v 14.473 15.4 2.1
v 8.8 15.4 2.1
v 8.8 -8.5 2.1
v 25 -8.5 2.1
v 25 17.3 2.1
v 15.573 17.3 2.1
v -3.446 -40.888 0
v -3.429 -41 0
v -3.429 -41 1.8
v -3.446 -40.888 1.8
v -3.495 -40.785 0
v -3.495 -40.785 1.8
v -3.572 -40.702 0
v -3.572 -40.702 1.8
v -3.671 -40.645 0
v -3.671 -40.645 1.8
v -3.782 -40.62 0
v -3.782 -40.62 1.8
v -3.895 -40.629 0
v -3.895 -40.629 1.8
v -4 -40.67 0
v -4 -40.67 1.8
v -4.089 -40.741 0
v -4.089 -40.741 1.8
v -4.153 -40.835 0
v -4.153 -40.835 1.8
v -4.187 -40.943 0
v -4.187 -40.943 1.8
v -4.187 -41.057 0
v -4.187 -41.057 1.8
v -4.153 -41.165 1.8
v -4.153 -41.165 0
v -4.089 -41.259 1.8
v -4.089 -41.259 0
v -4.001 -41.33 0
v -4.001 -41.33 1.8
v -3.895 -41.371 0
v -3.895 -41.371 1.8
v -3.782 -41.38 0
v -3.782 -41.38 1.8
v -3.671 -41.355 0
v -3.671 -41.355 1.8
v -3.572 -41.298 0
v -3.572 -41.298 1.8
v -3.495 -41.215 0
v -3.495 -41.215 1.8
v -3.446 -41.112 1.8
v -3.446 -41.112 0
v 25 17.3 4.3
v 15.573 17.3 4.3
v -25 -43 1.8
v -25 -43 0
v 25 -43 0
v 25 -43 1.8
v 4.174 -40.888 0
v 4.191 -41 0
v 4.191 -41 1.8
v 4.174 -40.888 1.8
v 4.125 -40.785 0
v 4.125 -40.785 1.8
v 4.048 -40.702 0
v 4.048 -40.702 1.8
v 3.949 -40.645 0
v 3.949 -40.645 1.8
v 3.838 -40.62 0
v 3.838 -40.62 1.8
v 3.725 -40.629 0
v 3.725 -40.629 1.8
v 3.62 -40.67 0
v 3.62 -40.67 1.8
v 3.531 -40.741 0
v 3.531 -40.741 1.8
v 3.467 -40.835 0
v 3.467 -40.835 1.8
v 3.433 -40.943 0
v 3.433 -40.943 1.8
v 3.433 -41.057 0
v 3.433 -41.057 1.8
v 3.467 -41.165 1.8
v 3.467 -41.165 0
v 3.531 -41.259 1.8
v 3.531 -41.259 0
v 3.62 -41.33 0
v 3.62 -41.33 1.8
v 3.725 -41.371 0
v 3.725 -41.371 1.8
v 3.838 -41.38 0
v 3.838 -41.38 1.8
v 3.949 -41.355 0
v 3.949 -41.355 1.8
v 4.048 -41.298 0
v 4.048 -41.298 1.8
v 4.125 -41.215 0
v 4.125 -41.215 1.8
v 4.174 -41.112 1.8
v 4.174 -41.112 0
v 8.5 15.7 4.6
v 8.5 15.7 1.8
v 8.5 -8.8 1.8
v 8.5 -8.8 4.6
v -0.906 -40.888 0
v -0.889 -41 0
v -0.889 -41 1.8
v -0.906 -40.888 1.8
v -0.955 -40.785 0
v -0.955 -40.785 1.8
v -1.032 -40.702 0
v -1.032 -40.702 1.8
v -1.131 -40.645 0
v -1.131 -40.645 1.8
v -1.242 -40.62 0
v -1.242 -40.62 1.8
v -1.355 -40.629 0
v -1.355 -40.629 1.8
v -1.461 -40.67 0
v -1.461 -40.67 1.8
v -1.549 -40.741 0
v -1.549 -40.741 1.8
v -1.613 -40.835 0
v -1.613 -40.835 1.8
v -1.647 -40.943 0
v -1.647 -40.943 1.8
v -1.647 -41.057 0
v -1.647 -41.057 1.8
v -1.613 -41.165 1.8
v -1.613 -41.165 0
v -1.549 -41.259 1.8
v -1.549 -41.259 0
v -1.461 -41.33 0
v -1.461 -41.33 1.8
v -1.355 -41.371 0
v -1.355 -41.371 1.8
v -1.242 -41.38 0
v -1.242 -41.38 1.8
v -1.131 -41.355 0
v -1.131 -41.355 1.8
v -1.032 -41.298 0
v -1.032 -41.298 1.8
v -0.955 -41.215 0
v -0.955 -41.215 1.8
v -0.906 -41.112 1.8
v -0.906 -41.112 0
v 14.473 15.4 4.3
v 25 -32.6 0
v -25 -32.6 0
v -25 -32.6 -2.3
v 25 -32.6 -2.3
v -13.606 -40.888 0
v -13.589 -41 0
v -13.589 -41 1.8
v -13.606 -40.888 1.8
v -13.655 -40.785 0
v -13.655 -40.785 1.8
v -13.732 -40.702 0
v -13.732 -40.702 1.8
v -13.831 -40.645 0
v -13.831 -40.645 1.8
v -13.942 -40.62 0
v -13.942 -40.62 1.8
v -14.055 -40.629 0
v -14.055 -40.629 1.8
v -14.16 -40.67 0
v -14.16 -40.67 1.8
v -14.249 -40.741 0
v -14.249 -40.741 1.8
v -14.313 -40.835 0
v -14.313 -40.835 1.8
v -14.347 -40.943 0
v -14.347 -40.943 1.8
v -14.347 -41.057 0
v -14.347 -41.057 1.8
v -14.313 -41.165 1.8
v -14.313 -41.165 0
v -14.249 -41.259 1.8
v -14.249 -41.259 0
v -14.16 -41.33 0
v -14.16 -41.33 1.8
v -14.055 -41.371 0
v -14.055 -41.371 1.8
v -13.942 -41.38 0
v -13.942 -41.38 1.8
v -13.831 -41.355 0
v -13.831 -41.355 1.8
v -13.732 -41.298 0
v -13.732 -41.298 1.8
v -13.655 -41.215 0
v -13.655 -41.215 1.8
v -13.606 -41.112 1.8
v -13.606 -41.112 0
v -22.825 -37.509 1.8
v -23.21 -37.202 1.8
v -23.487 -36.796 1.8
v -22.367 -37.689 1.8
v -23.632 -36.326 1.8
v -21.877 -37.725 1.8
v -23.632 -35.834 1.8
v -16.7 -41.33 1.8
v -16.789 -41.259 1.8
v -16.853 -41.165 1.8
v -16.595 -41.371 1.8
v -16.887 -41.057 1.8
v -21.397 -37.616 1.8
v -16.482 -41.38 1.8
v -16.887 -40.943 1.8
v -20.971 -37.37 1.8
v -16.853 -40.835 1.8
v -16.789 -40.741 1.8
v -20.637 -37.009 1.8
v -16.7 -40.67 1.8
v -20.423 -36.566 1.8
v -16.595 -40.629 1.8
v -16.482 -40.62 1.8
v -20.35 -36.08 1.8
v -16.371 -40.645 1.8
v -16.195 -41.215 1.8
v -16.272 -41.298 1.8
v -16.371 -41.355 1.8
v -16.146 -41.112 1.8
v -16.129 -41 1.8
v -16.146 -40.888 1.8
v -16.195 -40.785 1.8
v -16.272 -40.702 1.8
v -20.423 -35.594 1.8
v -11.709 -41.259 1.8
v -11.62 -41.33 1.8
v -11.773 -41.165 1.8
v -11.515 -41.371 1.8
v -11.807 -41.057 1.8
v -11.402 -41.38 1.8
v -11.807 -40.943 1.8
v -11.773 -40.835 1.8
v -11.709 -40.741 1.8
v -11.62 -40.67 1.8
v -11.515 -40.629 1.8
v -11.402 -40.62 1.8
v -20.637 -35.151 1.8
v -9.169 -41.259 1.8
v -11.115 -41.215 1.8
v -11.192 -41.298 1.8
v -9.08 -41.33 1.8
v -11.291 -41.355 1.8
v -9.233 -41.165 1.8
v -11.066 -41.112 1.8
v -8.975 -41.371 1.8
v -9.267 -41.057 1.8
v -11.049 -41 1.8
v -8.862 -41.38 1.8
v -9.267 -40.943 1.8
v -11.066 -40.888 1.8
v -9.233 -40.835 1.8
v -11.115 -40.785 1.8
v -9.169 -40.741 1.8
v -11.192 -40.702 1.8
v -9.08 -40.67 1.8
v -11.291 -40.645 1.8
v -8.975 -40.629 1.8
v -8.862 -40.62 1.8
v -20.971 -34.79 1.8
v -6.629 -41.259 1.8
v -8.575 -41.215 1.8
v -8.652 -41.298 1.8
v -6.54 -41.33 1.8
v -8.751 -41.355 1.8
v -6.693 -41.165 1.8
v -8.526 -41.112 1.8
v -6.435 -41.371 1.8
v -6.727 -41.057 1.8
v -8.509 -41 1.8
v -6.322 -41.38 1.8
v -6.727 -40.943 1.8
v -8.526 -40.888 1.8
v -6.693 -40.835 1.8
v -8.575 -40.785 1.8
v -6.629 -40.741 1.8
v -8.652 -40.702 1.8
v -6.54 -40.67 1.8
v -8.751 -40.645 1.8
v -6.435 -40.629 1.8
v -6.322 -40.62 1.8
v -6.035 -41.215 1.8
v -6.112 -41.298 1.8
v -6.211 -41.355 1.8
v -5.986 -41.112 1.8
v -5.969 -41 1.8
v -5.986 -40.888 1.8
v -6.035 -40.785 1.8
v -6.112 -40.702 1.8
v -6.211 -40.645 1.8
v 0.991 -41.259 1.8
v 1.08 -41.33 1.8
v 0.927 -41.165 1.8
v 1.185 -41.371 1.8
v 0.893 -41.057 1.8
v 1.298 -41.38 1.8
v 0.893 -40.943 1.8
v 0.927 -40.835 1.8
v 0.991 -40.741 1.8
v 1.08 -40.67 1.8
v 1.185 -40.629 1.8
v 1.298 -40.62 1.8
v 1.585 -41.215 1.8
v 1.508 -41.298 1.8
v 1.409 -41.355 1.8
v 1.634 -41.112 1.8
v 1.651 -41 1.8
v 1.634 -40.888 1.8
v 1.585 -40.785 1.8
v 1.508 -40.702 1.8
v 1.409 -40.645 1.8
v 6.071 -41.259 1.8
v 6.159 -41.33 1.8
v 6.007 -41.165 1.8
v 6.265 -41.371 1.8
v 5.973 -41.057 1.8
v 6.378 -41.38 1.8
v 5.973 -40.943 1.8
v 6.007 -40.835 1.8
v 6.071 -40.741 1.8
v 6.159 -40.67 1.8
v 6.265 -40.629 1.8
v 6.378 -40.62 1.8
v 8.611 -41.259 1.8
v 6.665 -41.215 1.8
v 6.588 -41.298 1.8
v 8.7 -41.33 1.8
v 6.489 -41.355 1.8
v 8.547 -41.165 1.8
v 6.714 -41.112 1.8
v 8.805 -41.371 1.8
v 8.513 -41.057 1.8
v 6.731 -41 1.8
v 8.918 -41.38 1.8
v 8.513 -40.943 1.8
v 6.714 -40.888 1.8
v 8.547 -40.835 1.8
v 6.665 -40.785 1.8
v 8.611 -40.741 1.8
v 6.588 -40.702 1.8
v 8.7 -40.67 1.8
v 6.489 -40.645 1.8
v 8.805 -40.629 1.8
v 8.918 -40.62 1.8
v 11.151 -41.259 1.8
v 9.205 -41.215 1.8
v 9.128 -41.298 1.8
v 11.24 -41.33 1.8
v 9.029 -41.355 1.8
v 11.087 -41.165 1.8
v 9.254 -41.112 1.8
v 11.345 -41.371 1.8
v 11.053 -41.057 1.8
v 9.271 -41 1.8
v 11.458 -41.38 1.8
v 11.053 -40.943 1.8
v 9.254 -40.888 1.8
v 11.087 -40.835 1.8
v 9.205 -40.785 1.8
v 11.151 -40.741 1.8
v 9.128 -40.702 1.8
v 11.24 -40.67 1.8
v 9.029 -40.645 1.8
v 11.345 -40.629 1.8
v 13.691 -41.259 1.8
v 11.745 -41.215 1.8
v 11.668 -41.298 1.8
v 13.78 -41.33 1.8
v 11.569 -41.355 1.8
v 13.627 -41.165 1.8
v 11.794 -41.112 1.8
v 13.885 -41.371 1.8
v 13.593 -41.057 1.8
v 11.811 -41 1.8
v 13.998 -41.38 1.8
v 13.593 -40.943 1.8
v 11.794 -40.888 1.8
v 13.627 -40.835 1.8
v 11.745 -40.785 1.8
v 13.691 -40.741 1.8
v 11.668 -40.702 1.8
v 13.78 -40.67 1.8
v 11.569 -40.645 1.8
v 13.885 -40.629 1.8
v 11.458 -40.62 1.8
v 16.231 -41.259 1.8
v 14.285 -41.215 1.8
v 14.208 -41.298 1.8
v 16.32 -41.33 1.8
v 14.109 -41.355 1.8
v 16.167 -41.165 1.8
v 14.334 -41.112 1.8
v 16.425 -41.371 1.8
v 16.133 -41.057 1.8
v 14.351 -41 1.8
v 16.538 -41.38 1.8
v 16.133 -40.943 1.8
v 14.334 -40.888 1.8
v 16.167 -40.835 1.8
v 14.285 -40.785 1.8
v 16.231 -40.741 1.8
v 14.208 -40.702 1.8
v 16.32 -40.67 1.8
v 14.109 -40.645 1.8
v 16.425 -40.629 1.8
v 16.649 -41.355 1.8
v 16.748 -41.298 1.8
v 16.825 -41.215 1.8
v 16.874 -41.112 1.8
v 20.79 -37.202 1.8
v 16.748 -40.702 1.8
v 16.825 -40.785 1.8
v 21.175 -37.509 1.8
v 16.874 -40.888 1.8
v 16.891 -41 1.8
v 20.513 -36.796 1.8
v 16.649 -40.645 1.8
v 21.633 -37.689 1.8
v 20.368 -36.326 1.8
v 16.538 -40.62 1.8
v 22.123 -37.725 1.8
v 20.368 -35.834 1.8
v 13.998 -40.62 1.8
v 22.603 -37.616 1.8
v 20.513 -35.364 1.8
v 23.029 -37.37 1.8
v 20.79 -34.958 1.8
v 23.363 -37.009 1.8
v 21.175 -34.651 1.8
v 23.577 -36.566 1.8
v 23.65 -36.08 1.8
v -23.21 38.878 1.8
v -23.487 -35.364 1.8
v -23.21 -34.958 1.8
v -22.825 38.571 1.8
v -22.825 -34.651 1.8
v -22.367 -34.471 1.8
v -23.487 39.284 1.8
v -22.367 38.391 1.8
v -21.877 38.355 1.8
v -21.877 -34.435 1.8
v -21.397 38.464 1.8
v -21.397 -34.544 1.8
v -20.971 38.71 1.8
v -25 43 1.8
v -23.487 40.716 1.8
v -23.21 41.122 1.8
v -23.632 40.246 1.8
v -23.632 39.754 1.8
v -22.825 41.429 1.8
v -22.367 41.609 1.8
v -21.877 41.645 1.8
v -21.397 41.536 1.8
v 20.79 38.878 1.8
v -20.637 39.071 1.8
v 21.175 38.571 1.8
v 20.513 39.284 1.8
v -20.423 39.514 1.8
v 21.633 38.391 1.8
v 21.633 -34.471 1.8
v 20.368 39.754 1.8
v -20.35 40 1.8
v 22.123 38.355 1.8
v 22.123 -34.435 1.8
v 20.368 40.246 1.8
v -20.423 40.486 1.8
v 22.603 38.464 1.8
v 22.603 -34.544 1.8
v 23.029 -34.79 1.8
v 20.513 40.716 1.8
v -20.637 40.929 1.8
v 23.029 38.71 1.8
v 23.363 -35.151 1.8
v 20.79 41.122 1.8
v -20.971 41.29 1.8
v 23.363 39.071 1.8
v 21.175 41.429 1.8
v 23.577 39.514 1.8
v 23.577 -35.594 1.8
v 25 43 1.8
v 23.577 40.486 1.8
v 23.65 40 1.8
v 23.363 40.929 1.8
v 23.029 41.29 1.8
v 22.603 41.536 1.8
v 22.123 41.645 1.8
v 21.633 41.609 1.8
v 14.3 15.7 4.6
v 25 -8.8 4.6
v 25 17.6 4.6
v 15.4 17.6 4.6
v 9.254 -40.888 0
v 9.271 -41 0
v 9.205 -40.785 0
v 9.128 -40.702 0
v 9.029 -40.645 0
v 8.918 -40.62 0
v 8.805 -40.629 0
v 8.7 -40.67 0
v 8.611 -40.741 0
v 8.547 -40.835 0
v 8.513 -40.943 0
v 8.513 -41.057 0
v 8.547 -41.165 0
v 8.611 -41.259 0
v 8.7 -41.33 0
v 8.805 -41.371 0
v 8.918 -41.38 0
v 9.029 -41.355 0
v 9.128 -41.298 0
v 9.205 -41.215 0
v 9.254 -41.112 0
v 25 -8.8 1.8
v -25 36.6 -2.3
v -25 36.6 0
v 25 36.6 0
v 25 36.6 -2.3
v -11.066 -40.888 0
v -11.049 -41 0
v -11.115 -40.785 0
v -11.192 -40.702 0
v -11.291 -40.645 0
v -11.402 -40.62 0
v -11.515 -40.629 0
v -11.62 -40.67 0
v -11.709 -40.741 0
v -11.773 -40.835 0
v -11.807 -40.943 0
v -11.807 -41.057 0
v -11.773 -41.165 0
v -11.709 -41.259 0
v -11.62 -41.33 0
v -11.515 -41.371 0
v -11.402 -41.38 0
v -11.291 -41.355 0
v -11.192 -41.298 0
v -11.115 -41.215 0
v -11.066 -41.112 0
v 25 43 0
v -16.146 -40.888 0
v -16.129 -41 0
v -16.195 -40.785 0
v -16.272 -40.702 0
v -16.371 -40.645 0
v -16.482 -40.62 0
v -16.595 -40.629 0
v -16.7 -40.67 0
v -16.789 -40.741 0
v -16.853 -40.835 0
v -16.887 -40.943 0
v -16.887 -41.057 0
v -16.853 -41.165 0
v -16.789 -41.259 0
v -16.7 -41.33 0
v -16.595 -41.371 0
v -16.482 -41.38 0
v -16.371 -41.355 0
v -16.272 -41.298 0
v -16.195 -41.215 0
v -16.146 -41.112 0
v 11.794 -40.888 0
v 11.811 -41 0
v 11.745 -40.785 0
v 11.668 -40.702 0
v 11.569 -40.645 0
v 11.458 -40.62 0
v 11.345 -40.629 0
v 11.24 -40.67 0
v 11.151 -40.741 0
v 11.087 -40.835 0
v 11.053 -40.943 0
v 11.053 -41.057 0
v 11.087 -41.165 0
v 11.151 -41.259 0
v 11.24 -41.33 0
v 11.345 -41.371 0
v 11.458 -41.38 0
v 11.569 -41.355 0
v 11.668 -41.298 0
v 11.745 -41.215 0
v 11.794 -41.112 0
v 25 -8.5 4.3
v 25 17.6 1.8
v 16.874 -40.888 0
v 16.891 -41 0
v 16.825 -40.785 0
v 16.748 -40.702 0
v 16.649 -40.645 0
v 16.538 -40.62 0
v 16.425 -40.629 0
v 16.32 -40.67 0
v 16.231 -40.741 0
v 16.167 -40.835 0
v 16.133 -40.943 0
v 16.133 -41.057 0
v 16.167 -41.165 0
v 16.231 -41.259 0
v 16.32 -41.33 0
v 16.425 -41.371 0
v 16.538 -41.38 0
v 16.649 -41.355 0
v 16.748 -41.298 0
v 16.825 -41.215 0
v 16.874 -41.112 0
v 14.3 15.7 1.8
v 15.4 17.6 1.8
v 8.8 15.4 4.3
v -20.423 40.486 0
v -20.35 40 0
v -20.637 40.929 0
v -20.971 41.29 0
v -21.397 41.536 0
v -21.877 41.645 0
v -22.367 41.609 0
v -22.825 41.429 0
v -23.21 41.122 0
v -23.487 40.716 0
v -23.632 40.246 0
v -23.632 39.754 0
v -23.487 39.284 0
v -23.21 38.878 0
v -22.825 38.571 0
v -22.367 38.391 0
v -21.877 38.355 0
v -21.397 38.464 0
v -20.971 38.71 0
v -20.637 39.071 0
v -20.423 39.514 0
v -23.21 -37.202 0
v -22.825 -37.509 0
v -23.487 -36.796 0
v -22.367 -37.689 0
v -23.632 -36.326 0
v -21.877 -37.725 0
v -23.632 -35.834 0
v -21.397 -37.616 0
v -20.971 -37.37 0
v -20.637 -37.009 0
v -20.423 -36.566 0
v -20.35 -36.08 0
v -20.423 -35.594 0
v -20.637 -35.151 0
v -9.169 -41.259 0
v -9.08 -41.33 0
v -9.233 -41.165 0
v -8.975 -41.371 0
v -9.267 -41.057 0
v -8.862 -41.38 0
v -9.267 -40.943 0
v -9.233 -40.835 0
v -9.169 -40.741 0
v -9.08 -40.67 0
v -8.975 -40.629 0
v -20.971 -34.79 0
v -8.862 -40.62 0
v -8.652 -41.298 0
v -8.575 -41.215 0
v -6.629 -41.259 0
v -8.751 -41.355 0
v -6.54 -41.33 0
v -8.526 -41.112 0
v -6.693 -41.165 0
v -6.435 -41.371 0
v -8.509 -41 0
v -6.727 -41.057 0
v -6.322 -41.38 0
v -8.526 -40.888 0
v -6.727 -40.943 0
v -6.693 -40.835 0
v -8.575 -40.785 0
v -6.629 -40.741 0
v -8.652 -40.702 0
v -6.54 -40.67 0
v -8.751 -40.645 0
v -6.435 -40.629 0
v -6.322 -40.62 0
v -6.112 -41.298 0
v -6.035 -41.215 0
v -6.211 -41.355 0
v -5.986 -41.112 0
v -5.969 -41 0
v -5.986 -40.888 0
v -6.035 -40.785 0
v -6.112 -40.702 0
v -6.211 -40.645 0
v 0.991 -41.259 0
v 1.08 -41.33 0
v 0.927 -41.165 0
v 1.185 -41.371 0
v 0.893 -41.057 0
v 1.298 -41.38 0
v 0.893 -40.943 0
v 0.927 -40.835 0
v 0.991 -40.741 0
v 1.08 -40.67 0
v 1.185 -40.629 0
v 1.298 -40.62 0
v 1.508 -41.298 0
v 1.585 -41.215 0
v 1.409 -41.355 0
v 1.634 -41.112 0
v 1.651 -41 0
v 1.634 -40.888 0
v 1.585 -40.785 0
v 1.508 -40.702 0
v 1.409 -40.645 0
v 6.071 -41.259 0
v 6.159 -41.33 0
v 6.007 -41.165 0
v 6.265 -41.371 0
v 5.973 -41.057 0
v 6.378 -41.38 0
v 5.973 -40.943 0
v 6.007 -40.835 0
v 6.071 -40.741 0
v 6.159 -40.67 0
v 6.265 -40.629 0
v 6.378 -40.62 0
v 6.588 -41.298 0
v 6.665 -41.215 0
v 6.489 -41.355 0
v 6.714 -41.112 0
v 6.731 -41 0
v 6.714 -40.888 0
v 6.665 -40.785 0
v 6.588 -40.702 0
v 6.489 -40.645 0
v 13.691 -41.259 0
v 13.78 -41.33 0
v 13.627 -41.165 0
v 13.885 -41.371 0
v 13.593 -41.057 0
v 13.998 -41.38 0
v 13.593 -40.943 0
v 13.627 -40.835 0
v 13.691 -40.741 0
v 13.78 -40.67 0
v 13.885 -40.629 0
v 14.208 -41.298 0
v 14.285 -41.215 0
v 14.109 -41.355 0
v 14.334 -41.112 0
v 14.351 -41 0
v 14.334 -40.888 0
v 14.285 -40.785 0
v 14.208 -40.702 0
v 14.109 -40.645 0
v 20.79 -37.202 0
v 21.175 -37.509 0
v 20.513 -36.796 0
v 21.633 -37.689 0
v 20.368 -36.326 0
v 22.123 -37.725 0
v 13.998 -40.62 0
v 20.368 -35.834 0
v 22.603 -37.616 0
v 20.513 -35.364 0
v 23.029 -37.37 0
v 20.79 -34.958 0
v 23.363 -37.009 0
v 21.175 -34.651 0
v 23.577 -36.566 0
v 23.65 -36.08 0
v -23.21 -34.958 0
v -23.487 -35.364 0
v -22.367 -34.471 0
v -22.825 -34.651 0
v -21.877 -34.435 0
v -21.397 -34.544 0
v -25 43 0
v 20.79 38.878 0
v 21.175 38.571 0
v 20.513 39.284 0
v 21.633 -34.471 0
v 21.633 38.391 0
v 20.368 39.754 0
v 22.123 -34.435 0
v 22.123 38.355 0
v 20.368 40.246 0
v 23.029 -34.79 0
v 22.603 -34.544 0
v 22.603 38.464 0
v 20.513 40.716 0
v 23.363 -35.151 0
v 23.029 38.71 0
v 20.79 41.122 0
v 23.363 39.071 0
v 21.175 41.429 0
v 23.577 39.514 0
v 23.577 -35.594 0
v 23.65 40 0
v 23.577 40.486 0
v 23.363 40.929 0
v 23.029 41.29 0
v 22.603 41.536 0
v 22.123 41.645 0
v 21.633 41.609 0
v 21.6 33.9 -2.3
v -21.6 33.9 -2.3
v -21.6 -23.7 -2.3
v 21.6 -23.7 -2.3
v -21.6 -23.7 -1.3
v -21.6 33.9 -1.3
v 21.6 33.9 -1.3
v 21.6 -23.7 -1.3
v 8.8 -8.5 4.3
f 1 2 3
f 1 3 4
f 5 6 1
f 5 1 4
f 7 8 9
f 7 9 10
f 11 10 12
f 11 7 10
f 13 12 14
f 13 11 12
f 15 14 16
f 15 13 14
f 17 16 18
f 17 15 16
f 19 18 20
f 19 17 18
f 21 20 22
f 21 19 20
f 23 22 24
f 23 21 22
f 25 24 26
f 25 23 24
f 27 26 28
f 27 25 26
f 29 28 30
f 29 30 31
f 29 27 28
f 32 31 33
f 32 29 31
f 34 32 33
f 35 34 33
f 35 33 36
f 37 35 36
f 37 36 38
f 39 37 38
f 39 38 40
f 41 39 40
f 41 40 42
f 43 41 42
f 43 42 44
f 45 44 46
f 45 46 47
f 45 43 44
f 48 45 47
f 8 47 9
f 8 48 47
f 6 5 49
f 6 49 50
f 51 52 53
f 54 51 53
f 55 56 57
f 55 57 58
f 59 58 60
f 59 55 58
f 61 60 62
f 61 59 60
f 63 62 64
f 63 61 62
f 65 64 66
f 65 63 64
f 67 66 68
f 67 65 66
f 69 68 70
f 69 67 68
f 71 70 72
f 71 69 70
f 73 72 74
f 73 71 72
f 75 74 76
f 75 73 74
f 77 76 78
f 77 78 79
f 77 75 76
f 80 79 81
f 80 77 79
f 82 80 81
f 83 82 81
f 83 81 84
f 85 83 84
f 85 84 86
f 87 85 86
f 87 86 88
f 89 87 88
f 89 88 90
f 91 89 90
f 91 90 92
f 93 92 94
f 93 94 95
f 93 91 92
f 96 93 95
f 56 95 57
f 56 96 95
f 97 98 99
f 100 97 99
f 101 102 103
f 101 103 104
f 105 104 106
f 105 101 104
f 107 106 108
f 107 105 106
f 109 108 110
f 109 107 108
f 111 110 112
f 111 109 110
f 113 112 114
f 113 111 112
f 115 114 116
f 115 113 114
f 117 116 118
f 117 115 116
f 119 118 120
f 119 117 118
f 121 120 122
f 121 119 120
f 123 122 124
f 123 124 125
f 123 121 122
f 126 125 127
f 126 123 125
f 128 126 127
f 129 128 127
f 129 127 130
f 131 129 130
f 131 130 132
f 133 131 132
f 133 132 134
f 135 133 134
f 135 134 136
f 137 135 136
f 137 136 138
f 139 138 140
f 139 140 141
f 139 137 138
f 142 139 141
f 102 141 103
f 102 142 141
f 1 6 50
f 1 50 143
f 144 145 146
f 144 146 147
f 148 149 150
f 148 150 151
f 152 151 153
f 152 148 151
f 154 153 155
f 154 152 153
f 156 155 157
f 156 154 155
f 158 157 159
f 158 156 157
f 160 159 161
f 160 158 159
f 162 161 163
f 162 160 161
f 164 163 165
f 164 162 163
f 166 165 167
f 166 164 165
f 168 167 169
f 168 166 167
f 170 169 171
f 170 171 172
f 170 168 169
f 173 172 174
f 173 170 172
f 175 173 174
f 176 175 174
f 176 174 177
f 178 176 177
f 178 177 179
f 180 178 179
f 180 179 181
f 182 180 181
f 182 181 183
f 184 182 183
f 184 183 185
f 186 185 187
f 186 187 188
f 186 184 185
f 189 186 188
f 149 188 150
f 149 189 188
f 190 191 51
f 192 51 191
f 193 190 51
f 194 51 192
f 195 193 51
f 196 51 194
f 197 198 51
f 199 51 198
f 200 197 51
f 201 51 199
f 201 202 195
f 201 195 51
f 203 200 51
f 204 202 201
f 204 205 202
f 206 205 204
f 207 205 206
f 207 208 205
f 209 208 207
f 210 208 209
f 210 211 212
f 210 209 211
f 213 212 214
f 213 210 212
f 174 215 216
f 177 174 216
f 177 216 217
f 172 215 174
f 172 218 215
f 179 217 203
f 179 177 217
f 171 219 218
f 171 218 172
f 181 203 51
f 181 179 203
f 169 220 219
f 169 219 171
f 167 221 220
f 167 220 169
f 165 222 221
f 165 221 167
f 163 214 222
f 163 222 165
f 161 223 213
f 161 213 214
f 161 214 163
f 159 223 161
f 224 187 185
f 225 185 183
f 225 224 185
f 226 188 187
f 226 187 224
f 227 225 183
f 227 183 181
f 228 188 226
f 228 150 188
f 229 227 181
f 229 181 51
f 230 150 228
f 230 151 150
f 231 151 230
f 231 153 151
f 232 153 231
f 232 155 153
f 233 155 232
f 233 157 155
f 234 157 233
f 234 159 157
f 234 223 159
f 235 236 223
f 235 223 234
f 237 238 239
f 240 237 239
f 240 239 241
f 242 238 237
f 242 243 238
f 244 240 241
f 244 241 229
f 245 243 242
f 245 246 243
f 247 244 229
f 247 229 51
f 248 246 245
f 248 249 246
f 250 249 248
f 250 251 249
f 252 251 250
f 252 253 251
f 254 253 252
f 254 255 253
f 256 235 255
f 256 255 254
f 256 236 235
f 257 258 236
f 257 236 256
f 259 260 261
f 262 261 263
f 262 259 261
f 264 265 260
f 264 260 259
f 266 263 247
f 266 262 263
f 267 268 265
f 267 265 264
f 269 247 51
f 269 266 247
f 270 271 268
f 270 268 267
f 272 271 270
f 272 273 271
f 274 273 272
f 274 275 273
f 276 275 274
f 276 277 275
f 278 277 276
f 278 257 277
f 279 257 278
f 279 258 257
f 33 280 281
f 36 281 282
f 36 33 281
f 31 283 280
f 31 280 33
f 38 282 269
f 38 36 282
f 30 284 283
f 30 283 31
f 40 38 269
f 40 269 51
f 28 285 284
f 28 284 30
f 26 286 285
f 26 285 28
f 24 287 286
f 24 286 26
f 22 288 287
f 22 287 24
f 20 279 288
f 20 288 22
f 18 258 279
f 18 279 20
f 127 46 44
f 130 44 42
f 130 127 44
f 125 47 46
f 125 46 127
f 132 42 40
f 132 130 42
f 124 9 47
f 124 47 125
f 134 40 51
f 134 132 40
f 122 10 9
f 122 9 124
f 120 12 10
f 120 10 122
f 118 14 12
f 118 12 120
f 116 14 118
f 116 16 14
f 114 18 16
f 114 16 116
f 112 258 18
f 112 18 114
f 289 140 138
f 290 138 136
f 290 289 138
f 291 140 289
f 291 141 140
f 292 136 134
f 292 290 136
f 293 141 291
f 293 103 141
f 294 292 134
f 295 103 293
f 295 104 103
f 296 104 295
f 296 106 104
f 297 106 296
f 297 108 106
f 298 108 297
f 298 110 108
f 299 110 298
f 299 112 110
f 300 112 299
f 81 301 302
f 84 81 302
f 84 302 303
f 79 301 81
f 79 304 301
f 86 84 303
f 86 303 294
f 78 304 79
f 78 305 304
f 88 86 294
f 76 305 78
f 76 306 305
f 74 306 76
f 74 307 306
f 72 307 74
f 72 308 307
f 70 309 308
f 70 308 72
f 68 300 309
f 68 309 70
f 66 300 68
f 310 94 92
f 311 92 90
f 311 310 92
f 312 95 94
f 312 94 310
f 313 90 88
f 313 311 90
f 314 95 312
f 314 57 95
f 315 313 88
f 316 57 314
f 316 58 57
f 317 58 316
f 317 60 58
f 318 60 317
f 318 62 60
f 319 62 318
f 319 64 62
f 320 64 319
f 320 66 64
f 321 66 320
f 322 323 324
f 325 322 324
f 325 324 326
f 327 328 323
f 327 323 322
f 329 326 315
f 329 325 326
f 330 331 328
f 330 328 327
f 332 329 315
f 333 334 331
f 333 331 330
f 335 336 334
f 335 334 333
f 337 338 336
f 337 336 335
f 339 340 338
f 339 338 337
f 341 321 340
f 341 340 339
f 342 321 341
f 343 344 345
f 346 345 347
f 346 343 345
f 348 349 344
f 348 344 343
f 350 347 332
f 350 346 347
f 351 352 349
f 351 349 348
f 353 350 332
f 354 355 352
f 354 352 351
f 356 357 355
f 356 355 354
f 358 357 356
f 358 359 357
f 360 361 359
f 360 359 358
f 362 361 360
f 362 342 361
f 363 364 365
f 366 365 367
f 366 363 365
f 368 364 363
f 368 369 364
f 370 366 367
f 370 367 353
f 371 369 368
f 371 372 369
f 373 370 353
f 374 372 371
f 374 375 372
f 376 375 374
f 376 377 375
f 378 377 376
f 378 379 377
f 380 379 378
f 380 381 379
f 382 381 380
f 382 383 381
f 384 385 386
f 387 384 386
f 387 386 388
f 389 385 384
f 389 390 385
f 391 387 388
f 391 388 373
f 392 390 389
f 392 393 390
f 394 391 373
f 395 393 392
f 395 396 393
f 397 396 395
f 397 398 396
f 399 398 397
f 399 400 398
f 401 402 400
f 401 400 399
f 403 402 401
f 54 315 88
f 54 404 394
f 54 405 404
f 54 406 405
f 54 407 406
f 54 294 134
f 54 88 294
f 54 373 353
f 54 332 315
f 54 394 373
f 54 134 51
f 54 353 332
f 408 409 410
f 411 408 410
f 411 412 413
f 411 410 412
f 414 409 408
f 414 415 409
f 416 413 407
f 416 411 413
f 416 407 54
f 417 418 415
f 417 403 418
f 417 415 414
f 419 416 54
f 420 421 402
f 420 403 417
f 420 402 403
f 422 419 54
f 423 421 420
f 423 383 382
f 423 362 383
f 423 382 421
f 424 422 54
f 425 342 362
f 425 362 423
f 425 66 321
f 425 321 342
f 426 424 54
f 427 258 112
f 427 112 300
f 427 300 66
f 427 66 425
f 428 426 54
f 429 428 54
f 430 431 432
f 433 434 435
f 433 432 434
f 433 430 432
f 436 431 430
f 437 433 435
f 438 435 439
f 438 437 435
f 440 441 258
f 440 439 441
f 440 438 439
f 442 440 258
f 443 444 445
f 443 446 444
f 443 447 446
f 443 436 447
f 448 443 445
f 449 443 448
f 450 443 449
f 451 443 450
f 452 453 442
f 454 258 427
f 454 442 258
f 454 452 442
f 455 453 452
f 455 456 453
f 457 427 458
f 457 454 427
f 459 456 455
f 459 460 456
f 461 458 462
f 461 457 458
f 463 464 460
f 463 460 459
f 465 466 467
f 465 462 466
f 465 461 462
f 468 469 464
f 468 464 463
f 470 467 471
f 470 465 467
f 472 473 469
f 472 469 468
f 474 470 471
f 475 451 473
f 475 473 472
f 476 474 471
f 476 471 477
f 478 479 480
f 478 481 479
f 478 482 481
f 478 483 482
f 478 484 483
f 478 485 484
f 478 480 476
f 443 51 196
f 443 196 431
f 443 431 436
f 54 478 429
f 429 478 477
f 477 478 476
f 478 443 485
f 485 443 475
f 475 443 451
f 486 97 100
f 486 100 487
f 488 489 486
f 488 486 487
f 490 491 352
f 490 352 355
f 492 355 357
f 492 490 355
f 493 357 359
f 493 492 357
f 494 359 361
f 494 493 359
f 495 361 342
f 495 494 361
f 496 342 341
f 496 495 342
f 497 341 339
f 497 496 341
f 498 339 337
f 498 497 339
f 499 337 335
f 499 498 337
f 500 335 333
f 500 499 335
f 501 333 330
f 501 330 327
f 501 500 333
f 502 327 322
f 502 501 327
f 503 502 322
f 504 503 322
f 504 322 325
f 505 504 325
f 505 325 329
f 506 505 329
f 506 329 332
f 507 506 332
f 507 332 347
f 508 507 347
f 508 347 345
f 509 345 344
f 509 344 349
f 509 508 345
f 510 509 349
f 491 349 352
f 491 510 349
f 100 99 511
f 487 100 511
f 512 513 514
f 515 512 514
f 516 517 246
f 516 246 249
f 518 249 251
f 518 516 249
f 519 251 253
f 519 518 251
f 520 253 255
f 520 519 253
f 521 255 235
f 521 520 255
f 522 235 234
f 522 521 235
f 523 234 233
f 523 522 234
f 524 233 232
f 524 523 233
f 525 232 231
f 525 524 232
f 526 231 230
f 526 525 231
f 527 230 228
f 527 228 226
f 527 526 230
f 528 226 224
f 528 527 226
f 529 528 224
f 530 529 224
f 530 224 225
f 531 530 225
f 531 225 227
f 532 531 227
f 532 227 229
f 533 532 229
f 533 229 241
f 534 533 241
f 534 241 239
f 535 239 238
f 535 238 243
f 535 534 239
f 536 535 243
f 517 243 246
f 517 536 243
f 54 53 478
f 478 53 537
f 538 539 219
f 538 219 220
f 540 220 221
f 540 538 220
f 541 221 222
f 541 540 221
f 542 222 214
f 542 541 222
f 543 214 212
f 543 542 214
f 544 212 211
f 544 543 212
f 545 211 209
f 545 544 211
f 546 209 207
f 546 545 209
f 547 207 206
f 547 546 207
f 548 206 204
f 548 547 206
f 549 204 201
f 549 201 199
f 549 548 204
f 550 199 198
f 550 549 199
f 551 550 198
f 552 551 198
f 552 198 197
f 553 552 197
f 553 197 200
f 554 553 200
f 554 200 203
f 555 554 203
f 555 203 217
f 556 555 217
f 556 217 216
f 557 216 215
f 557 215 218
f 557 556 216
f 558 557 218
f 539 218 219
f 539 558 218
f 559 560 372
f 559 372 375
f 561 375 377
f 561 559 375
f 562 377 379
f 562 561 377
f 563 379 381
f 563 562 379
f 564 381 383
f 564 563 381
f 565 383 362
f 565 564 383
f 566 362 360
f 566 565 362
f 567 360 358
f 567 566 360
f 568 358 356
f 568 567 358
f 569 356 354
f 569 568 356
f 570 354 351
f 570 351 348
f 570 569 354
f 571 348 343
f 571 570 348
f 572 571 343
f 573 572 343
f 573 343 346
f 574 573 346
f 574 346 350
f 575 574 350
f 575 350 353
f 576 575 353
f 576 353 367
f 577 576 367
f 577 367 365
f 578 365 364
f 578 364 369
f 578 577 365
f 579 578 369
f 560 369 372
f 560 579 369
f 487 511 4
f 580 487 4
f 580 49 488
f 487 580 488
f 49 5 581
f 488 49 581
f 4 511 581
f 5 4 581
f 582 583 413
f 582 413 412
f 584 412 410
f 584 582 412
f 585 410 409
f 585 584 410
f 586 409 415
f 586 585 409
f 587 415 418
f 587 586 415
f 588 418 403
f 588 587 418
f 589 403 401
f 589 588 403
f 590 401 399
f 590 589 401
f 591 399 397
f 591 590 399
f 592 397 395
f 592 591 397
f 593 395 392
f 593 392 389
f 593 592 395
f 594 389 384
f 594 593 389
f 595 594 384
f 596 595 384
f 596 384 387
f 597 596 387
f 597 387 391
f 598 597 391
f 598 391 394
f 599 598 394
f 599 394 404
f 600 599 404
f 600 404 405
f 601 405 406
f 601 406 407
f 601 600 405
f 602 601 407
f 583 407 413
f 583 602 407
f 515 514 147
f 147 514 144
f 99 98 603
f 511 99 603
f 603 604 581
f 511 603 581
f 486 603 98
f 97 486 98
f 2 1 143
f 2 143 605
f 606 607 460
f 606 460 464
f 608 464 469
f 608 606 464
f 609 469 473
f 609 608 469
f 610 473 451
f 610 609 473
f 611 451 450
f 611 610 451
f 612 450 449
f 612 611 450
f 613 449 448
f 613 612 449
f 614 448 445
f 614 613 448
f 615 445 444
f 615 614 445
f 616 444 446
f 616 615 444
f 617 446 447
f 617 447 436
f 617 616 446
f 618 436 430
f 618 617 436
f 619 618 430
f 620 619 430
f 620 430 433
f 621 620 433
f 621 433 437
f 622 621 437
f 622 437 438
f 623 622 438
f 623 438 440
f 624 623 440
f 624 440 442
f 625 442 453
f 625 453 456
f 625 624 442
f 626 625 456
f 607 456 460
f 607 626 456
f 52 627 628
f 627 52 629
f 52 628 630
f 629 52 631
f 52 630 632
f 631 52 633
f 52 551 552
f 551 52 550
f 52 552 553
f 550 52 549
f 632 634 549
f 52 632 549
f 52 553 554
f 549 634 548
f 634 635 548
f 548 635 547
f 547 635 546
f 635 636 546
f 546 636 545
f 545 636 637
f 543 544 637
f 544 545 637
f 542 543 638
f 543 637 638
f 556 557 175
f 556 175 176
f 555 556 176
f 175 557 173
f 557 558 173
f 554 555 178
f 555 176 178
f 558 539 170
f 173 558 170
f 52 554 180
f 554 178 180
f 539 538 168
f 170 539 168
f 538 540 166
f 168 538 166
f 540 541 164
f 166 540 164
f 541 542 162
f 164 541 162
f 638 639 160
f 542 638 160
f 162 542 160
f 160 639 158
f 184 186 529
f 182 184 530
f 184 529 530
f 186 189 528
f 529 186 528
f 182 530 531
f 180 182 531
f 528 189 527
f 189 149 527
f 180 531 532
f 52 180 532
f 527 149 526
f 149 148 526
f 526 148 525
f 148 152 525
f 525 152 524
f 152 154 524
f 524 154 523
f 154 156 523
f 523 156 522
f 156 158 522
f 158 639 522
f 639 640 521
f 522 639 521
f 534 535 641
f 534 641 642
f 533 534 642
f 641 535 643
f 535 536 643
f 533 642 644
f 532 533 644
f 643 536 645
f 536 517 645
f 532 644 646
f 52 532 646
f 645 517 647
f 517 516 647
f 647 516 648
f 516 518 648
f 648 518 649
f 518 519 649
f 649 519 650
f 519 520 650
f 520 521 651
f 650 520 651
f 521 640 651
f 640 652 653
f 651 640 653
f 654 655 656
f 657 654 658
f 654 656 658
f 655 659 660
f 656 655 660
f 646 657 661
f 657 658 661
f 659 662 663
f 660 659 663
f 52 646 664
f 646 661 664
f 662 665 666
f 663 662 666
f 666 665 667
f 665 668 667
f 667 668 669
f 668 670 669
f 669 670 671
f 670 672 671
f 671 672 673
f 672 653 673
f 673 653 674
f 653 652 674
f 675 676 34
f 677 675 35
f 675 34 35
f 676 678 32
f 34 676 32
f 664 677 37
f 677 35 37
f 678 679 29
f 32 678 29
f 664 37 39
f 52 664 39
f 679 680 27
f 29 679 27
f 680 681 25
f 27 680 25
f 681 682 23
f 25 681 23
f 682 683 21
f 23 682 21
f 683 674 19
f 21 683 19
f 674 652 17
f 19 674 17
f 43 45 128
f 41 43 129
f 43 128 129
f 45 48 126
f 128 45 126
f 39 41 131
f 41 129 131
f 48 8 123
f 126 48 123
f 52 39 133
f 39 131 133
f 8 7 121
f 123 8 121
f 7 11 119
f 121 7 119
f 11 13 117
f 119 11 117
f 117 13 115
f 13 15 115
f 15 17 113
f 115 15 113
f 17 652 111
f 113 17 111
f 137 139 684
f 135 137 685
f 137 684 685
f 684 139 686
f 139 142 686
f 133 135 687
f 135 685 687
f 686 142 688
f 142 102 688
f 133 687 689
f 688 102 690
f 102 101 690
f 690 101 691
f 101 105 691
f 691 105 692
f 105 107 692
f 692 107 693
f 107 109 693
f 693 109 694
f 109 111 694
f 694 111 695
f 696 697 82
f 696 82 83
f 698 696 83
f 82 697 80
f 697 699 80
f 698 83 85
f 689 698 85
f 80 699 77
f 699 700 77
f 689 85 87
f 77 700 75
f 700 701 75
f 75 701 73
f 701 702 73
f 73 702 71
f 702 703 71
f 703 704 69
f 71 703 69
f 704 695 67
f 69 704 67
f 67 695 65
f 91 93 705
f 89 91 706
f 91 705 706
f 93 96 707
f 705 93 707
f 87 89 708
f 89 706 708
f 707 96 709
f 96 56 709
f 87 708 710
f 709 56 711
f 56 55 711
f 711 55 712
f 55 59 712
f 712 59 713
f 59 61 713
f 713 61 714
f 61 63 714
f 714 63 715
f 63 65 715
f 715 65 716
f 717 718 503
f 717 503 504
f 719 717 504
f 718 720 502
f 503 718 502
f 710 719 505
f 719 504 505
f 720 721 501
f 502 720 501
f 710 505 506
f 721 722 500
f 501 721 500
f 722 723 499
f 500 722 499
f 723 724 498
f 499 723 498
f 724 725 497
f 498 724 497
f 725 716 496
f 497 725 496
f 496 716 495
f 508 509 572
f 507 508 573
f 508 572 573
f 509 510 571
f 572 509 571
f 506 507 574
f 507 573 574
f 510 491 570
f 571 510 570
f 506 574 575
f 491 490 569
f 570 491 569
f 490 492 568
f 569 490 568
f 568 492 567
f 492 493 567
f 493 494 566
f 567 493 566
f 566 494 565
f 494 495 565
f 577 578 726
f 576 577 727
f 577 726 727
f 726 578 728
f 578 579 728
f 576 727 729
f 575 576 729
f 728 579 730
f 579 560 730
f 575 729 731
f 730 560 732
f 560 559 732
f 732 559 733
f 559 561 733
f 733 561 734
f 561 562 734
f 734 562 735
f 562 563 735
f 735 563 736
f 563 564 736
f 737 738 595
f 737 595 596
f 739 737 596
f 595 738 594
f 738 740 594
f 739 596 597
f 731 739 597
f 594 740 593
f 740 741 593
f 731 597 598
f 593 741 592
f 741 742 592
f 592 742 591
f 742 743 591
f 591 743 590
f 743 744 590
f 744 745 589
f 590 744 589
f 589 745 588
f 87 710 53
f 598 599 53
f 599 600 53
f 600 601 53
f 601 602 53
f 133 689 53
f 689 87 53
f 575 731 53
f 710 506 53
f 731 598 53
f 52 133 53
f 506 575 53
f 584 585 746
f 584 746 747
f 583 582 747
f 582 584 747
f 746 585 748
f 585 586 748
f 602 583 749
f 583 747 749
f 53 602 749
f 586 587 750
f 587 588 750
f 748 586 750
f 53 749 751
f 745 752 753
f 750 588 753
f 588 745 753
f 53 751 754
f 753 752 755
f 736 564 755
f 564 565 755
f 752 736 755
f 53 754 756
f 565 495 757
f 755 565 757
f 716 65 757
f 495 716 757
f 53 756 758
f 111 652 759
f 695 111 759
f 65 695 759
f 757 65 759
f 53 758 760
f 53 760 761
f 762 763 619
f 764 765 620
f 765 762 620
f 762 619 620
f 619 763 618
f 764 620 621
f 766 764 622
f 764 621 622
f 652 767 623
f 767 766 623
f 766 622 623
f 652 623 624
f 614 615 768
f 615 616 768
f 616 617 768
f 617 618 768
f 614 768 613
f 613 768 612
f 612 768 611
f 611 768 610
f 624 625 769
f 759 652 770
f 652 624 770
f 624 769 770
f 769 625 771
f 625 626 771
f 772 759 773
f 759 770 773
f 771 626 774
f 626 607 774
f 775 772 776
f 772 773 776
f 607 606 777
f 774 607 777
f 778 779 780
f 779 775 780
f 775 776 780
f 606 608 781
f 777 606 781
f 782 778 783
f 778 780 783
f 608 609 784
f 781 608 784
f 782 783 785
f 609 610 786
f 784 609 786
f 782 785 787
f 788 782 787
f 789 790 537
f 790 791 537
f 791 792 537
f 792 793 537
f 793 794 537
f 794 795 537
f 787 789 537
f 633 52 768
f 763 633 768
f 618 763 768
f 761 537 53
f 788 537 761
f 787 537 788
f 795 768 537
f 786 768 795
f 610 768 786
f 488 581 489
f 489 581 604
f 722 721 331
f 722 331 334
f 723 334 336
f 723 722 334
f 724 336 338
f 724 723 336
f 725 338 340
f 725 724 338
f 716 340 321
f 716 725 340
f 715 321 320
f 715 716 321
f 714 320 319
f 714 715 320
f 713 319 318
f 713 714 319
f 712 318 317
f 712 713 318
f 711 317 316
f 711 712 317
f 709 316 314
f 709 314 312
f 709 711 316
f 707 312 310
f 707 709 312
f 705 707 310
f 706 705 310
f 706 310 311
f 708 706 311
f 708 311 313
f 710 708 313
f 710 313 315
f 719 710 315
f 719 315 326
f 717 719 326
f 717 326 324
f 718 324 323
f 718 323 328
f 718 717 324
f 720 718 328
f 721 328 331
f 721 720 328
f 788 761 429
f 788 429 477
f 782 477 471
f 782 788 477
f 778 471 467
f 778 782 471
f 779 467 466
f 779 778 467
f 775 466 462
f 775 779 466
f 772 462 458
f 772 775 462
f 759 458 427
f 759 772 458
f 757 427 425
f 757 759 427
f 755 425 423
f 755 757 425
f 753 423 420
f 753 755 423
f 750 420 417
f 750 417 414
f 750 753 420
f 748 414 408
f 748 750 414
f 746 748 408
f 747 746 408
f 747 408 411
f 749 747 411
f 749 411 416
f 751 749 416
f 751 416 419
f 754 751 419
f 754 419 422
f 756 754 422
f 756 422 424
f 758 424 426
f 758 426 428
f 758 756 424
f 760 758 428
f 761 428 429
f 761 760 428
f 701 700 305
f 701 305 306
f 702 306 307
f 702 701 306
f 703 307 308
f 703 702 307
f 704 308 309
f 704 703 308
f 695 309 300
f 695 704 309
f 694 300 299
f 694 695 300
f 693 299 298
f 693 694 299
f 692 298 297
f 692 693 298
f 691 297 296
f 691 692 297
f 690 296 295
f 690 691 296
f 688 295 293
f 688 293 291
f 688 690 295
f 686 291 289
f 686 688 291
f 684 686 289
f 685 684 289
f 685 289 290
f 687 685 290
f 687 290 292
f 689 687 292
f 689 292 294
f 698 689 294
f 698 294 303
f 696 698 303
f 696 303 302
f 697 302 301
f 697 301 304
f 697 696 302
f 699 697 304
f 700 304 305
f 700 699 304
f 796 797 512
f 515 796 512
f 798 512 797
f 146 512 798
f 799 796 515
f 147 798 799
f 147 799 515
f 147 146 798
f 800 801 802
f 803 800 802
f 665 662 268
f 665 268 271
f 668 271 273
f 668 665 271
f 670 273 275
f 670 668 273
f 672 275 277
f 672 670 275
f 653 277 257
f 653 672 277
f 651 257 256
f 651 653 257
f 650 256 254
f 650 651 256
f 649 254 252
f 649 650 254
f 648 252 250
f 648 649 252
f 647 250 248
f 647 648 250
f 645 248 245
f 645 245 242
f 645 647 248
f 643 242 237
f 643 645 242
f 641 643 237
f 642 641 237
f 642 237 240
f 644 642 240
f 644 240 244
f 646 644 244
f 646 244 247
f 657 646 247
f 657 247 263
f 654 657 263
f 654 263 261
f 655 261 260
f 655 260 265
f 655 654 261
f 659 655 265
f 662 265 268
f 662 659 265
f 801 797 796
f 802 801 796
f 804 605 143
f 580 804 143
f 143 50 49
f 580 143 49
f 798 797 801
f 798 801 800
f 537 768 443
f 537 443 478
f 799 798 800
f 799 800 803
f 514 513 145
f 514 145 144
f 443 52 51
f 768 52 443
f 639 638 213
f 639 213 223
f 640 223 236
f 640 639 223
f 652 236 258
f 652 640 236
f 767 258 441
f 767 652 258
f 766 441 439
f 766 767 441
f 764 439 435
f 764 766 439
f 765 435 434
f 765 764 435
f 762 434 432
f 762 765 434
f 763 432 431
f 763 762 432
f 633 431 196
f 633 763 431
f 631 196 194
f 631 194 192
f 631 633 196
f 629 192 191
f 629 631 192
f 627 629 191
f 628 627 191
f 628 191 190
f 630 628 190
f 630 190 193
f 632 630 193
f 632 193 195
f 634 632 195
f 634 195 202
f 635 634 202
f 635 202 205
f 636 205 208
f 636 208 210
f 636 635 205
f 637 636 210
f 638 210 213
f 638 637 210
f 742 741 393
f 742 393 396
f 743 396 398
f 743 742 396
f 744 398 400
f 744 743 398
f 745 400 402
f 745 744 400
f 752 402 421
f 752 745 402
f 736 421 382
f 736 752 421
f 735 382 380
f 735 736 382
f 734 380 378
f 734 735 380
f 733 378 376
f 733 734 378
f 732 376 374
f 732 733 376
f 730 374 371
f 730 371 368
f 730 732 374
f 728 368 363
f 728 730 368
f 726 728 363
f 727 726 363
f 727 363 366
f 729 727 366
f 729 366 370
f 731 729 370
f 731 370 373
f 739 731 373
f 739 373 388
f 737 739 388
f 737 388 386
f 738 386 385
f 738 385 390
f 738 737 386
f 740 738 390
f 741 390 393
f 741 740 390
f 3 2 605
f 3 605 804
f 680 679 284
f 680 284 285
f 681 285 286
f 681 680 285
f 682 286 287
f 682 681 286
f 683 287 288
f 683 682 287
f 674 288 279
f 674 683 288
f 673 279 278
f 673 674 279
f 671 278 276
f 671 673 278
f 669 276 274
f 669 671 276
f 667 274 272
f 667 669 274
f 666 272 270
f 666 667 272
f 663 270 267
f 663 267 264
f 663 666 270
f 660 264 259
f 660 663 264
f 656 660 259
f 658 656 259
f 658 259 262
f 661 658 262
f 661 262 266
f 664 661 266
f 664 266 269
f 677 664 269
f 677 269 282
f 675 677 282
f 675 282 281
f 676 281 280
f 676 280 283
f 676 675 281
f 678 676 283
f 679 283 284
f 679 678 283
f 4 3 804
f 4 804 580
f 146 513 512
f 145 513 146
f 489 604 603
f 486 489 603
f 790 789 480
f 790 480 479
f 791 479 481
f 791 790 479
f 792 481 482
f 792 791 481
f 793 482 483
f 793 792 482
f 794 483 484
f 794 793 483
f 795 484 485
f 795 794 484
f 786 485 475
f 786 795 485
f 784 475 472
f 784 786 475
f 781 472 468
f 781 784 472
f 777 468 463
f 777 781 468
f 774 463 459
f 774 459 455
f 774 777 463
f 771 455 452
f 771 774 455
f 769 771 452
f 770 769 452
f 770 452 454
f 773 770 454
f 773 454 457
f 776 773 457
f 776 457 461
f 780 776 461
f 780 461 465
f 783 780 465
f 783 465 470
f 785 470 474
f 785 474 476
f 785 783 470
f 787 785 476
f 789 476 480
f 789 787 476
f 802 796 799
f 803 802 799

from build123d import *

# Parameters (mm, degrees)
F0_W     = 50
F0_H     = 86
F0_R     = 1.65
F0_R_2   = 0.381
F1_DEPTH = 1.8
F2_W     = 50
F2_H     = 69.2
F3_DEPTH = 2.3
F4_W     = 43.2
F4_H     = 57.6
F5_DEPTH = 1
F7_DEPTH = 2.8
F8_T     = -0.3


with BuildPart() as f1:
    # F0 (on Top) → F1 (new body)
    with BuildSketch(Plane.XY):
        Rectangle(F0_W, F0_H)
        with Locations((-22, -36.08)):
            Circle(F0_R, mode=Mode.SUBTRACT)
        with Locations((-16.51, -41)):
            Circle(F0_R_2, mode=Mode.SUBTRACT)
        with Locations((-13.97, -41)):
            Circle(F0_R_2, mode=Mode.SUBTRACT)
        with Locations((-11.43, -41)):
            Circle(F0_R_2, mode=Mode.SUBTRACT)
        with Locations((-8.89, -41)):
            Circle(F0_R_2, mode=Mode.SUBTRACT)
        with Locations((-6.35, -41)):
            Circle(F0_R_2, mode=Mode.SUBTRACT)
        with Locations((-3.81, -41)):
            Circle(F0_R_2, mode=Mode.SUBTRACT)
        with Locations((-1.27, -41)):
            Circle(F0_R_2, mode=Mode.SUBTRACT)
        with Locations((1.27, -41)):
            Circle(F0_R_2, mode=Mode.SUBTRACT)
        with Locations((3.81, -41)):
            Circle(F0_R_2, mode=Mode.SUBTRACT)
        with Locations((6.35, -41)):
            Circle(F0_R_2, mode=Mode.SUBTRACT)
        with Locations((8.89, -41)):
            Circle(F0_R_2, mode=Mode.SUBTRACT)
        with Locations((11.43, -41)):
            Circle(F0_R_2, mode=Mode.SUBTRACT)
        with Locations((13.97, -41)):
            Circle(F0_R_2, mode=Mode.SUBTRACT)
        with Locations((16.51, -41)):
            Circle(F0_R_2, mode=Mode.SUBTRACT)
        with Locations((22, -36.08)):
            Circle(F0_R, mode=Mode.SUBTRACT)
        with Locations((-22, 40)):
            Circle(F0_R, mode=Mode.SUBTRACT)
        with Locations((22, 40)):
            Circle(F0_R, mode=Mode.SUBTRACT)
    extrude(amount=F1_DEPTH)


with BuildPart() as f3:
    # F2 (on face) → F3 (new body)
    with BuildSketch(Plane(origin=(0, 0, 0), x_dir=(1, 0, 0), z_dir=(0, 0, -1))):
        with Locations((0, -2)):
            Rectangle(F2_W, F2_H)
    extrude(amount=F3_DEPTH)

    # F4 (on face) → F5 (cut)
    with BuildSketch(Plane(origin=(0, 0, -2.3), x_dir=(1, 0, 0), z_dir=(0, 0, -1))):
        with Locations((0, -5.1)):
            Rectangle(F4_W, F4_H)
    extrude(amount=-F5_DEPTH, mode=Mode.SUBTRACT)


with BuildPart() as f7:
    # F6 (on face) → F7 (new body)
    with BuildSketch(Plane.XY.offset(1.8)):
        Polygon((14.3, 15.7), (8.5, 15.7), (8.5, -8.8), (25, -8.8), (25, 17.6), (15.4, 17.6), align=None)
    extrude(amount=F7_DEPTH)

    # F8
    f8_openings = [f7.faces().sort_by_distance(p)[0] for p in [
        (25, 4.4, 3.2),
    ]]
    offset(amount=F8_T, openings=f8_openings, kind=Kind.INTERSECTION)


solid = Compound([f1.part, f3.part, f7.part])
